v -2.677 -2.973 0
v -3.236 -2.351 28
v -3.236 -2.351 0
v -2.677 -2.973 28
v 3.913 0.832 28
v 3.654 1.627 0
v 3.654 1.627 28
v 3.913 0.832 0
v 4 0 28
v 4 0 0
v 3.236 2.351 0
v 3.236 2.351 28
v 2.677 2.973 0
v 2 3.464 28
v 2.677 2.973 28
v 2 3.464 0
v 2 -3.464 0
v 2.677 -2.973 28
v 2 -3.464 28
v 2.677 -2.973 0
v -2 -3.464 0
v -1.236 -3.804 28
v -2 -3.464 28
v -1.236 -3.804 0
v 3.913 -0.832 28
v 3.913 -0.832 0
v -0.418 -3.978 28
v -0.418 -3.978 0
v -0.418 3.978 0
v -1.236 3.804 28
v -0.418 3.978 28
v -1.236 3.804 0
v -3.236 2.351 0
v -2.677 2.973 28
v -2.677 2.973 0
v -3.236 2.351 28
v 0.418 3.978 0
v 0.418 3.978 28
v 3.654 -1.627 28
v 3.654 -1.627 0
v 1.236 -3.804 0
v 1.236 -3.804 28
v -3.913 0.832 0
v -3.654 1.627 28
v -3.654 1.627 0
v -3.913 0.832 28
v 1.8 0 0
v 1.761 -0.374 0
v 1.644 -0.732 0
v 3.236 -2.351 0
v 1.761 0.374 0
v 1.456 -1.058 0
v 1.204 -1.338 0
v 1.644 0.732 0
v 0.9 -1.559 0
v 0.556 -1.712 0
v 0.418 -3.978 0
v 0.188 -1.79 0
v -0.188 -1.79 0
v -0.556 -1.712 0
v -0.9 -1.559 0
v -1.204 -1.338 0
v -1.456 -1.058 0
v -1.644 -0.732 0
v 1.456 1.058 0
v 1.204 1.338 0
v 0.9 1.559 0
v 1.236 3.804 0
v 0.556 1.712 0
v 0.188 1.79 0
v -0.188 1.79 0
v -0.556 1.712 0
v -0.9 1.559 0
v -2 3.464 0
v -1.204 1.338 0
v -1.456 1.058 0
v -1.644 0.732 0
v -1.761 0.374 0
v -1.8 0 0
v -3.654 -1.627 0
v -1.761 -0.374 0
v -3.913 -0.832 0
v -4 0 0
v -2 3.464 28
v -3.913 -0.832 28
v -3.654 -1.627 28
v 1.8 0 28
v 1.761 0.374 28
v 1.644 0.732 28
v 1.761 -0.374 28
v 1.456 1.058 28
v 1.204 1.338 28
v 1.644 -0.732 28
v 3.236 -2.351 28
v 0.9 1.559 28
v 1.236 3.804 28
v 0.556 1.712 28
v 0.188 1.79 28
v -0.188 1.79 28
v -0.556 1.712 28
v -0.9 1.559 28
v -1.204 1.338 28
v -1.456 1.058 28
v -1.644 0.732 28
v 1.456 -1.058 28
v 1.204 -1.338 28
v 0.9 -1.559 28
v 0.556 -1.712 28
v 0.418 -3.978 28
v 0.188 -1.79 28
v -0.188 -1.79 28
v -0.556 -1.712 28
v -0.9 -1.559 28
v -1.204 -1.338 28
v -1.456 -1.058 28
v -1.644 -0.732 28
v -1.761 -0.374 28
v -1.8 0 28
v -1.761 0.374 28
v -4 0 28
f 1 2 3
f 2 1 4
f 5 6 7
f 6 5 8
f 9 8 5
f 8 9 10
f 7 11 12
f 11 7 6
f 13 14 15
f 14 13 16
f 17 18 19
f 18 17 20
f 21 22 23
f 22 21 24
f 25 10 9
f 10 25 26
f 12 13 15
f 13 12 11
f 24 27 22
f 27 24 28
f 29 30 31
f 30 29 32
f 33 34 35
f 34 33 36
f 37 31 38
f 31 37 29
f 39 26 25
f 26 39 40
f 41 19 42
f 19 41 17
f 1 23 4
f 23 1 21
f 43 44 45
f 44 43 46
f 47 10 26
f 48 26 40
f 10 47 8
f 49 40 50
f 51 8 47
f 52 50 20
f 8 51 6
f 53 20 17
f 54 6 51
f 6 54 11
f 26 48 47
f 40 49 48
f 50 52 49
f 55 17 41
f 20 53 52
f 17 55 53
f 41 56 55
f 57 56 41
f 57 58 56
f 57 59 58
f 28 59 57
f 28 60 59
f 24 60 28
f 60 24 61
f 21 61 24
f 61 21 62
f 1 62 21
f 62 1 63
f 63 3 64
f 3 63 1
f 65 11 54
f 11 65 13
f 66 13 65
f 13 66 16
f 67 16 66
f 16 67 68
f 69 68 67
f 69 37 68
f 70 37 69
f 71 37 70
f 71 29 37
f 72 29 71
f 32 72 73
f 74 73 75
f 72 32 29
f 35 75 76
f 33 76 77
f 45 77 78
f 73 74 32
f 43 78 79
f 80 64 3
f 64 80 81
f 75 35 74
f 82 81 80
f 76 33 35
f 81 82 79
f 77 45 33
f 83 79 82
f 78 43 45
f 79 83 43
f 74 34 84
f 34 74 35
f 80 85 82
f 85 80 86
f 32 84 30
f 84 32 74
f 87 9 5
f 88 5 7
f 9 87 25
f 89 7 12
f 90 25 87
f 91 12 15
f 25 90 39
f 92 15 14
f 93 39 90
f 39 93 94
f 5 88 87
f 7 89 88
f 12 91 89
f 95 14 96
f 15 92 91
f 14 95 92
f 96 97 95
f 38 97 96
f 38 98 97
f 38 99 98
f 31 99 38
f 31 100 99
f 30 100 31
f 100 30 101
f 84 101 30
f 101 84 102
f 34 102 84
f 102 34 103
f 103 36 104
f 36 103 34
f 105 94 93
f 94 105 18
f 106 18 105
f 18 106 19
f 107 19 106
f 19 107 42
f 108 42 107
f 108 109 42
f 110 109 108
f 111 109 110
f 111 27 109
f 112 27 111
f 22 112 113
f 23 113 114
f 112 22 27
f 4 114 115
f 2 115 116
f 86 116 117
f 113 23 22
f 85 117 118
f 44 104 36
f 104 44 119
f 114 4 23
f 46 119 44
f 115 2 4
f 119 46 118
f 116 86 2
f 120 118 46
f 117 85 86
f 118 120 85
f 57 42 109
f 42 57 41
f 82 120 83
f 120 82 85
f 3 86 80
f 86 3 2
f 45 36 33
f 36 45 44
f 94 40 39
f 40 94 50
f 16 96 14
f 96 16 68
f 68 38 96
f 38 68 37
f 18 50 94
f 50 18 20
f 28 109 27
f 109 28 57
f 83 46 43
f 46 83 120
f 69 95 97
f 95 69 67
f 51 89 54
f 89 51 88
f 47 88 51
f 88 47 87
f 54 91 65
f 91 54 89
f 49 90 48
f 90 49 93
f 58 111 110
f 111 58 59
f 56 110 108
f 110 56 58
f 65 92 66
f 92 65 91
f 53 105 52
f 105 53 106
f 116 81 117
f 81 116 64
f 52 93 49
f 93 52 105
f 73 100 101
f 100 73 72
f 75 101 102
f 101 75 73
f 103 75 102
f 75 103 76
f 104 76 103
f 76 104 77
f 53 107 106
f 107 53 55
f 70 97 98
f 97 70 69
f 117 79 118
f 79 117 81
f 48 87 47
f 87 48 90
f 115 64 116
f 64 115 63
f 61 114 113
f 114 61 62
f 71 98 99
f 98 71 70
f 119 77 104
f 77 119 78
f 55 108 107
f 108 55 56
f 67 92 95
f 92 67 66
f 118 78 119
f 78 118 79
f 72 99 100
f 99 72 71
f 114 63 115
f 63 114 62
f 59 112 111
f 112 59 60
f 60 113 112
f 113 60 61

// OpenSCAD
HEIGHT = 28;
DIAMETER = 8;
INNER_DIAMETER = 3.6;

$fn = 30;

difference() {
    cylinder(d = DIAMETER, h = HEIGHT);
    cylinder(d = INNER_DIAMETER, h = HEIGHT);
}
